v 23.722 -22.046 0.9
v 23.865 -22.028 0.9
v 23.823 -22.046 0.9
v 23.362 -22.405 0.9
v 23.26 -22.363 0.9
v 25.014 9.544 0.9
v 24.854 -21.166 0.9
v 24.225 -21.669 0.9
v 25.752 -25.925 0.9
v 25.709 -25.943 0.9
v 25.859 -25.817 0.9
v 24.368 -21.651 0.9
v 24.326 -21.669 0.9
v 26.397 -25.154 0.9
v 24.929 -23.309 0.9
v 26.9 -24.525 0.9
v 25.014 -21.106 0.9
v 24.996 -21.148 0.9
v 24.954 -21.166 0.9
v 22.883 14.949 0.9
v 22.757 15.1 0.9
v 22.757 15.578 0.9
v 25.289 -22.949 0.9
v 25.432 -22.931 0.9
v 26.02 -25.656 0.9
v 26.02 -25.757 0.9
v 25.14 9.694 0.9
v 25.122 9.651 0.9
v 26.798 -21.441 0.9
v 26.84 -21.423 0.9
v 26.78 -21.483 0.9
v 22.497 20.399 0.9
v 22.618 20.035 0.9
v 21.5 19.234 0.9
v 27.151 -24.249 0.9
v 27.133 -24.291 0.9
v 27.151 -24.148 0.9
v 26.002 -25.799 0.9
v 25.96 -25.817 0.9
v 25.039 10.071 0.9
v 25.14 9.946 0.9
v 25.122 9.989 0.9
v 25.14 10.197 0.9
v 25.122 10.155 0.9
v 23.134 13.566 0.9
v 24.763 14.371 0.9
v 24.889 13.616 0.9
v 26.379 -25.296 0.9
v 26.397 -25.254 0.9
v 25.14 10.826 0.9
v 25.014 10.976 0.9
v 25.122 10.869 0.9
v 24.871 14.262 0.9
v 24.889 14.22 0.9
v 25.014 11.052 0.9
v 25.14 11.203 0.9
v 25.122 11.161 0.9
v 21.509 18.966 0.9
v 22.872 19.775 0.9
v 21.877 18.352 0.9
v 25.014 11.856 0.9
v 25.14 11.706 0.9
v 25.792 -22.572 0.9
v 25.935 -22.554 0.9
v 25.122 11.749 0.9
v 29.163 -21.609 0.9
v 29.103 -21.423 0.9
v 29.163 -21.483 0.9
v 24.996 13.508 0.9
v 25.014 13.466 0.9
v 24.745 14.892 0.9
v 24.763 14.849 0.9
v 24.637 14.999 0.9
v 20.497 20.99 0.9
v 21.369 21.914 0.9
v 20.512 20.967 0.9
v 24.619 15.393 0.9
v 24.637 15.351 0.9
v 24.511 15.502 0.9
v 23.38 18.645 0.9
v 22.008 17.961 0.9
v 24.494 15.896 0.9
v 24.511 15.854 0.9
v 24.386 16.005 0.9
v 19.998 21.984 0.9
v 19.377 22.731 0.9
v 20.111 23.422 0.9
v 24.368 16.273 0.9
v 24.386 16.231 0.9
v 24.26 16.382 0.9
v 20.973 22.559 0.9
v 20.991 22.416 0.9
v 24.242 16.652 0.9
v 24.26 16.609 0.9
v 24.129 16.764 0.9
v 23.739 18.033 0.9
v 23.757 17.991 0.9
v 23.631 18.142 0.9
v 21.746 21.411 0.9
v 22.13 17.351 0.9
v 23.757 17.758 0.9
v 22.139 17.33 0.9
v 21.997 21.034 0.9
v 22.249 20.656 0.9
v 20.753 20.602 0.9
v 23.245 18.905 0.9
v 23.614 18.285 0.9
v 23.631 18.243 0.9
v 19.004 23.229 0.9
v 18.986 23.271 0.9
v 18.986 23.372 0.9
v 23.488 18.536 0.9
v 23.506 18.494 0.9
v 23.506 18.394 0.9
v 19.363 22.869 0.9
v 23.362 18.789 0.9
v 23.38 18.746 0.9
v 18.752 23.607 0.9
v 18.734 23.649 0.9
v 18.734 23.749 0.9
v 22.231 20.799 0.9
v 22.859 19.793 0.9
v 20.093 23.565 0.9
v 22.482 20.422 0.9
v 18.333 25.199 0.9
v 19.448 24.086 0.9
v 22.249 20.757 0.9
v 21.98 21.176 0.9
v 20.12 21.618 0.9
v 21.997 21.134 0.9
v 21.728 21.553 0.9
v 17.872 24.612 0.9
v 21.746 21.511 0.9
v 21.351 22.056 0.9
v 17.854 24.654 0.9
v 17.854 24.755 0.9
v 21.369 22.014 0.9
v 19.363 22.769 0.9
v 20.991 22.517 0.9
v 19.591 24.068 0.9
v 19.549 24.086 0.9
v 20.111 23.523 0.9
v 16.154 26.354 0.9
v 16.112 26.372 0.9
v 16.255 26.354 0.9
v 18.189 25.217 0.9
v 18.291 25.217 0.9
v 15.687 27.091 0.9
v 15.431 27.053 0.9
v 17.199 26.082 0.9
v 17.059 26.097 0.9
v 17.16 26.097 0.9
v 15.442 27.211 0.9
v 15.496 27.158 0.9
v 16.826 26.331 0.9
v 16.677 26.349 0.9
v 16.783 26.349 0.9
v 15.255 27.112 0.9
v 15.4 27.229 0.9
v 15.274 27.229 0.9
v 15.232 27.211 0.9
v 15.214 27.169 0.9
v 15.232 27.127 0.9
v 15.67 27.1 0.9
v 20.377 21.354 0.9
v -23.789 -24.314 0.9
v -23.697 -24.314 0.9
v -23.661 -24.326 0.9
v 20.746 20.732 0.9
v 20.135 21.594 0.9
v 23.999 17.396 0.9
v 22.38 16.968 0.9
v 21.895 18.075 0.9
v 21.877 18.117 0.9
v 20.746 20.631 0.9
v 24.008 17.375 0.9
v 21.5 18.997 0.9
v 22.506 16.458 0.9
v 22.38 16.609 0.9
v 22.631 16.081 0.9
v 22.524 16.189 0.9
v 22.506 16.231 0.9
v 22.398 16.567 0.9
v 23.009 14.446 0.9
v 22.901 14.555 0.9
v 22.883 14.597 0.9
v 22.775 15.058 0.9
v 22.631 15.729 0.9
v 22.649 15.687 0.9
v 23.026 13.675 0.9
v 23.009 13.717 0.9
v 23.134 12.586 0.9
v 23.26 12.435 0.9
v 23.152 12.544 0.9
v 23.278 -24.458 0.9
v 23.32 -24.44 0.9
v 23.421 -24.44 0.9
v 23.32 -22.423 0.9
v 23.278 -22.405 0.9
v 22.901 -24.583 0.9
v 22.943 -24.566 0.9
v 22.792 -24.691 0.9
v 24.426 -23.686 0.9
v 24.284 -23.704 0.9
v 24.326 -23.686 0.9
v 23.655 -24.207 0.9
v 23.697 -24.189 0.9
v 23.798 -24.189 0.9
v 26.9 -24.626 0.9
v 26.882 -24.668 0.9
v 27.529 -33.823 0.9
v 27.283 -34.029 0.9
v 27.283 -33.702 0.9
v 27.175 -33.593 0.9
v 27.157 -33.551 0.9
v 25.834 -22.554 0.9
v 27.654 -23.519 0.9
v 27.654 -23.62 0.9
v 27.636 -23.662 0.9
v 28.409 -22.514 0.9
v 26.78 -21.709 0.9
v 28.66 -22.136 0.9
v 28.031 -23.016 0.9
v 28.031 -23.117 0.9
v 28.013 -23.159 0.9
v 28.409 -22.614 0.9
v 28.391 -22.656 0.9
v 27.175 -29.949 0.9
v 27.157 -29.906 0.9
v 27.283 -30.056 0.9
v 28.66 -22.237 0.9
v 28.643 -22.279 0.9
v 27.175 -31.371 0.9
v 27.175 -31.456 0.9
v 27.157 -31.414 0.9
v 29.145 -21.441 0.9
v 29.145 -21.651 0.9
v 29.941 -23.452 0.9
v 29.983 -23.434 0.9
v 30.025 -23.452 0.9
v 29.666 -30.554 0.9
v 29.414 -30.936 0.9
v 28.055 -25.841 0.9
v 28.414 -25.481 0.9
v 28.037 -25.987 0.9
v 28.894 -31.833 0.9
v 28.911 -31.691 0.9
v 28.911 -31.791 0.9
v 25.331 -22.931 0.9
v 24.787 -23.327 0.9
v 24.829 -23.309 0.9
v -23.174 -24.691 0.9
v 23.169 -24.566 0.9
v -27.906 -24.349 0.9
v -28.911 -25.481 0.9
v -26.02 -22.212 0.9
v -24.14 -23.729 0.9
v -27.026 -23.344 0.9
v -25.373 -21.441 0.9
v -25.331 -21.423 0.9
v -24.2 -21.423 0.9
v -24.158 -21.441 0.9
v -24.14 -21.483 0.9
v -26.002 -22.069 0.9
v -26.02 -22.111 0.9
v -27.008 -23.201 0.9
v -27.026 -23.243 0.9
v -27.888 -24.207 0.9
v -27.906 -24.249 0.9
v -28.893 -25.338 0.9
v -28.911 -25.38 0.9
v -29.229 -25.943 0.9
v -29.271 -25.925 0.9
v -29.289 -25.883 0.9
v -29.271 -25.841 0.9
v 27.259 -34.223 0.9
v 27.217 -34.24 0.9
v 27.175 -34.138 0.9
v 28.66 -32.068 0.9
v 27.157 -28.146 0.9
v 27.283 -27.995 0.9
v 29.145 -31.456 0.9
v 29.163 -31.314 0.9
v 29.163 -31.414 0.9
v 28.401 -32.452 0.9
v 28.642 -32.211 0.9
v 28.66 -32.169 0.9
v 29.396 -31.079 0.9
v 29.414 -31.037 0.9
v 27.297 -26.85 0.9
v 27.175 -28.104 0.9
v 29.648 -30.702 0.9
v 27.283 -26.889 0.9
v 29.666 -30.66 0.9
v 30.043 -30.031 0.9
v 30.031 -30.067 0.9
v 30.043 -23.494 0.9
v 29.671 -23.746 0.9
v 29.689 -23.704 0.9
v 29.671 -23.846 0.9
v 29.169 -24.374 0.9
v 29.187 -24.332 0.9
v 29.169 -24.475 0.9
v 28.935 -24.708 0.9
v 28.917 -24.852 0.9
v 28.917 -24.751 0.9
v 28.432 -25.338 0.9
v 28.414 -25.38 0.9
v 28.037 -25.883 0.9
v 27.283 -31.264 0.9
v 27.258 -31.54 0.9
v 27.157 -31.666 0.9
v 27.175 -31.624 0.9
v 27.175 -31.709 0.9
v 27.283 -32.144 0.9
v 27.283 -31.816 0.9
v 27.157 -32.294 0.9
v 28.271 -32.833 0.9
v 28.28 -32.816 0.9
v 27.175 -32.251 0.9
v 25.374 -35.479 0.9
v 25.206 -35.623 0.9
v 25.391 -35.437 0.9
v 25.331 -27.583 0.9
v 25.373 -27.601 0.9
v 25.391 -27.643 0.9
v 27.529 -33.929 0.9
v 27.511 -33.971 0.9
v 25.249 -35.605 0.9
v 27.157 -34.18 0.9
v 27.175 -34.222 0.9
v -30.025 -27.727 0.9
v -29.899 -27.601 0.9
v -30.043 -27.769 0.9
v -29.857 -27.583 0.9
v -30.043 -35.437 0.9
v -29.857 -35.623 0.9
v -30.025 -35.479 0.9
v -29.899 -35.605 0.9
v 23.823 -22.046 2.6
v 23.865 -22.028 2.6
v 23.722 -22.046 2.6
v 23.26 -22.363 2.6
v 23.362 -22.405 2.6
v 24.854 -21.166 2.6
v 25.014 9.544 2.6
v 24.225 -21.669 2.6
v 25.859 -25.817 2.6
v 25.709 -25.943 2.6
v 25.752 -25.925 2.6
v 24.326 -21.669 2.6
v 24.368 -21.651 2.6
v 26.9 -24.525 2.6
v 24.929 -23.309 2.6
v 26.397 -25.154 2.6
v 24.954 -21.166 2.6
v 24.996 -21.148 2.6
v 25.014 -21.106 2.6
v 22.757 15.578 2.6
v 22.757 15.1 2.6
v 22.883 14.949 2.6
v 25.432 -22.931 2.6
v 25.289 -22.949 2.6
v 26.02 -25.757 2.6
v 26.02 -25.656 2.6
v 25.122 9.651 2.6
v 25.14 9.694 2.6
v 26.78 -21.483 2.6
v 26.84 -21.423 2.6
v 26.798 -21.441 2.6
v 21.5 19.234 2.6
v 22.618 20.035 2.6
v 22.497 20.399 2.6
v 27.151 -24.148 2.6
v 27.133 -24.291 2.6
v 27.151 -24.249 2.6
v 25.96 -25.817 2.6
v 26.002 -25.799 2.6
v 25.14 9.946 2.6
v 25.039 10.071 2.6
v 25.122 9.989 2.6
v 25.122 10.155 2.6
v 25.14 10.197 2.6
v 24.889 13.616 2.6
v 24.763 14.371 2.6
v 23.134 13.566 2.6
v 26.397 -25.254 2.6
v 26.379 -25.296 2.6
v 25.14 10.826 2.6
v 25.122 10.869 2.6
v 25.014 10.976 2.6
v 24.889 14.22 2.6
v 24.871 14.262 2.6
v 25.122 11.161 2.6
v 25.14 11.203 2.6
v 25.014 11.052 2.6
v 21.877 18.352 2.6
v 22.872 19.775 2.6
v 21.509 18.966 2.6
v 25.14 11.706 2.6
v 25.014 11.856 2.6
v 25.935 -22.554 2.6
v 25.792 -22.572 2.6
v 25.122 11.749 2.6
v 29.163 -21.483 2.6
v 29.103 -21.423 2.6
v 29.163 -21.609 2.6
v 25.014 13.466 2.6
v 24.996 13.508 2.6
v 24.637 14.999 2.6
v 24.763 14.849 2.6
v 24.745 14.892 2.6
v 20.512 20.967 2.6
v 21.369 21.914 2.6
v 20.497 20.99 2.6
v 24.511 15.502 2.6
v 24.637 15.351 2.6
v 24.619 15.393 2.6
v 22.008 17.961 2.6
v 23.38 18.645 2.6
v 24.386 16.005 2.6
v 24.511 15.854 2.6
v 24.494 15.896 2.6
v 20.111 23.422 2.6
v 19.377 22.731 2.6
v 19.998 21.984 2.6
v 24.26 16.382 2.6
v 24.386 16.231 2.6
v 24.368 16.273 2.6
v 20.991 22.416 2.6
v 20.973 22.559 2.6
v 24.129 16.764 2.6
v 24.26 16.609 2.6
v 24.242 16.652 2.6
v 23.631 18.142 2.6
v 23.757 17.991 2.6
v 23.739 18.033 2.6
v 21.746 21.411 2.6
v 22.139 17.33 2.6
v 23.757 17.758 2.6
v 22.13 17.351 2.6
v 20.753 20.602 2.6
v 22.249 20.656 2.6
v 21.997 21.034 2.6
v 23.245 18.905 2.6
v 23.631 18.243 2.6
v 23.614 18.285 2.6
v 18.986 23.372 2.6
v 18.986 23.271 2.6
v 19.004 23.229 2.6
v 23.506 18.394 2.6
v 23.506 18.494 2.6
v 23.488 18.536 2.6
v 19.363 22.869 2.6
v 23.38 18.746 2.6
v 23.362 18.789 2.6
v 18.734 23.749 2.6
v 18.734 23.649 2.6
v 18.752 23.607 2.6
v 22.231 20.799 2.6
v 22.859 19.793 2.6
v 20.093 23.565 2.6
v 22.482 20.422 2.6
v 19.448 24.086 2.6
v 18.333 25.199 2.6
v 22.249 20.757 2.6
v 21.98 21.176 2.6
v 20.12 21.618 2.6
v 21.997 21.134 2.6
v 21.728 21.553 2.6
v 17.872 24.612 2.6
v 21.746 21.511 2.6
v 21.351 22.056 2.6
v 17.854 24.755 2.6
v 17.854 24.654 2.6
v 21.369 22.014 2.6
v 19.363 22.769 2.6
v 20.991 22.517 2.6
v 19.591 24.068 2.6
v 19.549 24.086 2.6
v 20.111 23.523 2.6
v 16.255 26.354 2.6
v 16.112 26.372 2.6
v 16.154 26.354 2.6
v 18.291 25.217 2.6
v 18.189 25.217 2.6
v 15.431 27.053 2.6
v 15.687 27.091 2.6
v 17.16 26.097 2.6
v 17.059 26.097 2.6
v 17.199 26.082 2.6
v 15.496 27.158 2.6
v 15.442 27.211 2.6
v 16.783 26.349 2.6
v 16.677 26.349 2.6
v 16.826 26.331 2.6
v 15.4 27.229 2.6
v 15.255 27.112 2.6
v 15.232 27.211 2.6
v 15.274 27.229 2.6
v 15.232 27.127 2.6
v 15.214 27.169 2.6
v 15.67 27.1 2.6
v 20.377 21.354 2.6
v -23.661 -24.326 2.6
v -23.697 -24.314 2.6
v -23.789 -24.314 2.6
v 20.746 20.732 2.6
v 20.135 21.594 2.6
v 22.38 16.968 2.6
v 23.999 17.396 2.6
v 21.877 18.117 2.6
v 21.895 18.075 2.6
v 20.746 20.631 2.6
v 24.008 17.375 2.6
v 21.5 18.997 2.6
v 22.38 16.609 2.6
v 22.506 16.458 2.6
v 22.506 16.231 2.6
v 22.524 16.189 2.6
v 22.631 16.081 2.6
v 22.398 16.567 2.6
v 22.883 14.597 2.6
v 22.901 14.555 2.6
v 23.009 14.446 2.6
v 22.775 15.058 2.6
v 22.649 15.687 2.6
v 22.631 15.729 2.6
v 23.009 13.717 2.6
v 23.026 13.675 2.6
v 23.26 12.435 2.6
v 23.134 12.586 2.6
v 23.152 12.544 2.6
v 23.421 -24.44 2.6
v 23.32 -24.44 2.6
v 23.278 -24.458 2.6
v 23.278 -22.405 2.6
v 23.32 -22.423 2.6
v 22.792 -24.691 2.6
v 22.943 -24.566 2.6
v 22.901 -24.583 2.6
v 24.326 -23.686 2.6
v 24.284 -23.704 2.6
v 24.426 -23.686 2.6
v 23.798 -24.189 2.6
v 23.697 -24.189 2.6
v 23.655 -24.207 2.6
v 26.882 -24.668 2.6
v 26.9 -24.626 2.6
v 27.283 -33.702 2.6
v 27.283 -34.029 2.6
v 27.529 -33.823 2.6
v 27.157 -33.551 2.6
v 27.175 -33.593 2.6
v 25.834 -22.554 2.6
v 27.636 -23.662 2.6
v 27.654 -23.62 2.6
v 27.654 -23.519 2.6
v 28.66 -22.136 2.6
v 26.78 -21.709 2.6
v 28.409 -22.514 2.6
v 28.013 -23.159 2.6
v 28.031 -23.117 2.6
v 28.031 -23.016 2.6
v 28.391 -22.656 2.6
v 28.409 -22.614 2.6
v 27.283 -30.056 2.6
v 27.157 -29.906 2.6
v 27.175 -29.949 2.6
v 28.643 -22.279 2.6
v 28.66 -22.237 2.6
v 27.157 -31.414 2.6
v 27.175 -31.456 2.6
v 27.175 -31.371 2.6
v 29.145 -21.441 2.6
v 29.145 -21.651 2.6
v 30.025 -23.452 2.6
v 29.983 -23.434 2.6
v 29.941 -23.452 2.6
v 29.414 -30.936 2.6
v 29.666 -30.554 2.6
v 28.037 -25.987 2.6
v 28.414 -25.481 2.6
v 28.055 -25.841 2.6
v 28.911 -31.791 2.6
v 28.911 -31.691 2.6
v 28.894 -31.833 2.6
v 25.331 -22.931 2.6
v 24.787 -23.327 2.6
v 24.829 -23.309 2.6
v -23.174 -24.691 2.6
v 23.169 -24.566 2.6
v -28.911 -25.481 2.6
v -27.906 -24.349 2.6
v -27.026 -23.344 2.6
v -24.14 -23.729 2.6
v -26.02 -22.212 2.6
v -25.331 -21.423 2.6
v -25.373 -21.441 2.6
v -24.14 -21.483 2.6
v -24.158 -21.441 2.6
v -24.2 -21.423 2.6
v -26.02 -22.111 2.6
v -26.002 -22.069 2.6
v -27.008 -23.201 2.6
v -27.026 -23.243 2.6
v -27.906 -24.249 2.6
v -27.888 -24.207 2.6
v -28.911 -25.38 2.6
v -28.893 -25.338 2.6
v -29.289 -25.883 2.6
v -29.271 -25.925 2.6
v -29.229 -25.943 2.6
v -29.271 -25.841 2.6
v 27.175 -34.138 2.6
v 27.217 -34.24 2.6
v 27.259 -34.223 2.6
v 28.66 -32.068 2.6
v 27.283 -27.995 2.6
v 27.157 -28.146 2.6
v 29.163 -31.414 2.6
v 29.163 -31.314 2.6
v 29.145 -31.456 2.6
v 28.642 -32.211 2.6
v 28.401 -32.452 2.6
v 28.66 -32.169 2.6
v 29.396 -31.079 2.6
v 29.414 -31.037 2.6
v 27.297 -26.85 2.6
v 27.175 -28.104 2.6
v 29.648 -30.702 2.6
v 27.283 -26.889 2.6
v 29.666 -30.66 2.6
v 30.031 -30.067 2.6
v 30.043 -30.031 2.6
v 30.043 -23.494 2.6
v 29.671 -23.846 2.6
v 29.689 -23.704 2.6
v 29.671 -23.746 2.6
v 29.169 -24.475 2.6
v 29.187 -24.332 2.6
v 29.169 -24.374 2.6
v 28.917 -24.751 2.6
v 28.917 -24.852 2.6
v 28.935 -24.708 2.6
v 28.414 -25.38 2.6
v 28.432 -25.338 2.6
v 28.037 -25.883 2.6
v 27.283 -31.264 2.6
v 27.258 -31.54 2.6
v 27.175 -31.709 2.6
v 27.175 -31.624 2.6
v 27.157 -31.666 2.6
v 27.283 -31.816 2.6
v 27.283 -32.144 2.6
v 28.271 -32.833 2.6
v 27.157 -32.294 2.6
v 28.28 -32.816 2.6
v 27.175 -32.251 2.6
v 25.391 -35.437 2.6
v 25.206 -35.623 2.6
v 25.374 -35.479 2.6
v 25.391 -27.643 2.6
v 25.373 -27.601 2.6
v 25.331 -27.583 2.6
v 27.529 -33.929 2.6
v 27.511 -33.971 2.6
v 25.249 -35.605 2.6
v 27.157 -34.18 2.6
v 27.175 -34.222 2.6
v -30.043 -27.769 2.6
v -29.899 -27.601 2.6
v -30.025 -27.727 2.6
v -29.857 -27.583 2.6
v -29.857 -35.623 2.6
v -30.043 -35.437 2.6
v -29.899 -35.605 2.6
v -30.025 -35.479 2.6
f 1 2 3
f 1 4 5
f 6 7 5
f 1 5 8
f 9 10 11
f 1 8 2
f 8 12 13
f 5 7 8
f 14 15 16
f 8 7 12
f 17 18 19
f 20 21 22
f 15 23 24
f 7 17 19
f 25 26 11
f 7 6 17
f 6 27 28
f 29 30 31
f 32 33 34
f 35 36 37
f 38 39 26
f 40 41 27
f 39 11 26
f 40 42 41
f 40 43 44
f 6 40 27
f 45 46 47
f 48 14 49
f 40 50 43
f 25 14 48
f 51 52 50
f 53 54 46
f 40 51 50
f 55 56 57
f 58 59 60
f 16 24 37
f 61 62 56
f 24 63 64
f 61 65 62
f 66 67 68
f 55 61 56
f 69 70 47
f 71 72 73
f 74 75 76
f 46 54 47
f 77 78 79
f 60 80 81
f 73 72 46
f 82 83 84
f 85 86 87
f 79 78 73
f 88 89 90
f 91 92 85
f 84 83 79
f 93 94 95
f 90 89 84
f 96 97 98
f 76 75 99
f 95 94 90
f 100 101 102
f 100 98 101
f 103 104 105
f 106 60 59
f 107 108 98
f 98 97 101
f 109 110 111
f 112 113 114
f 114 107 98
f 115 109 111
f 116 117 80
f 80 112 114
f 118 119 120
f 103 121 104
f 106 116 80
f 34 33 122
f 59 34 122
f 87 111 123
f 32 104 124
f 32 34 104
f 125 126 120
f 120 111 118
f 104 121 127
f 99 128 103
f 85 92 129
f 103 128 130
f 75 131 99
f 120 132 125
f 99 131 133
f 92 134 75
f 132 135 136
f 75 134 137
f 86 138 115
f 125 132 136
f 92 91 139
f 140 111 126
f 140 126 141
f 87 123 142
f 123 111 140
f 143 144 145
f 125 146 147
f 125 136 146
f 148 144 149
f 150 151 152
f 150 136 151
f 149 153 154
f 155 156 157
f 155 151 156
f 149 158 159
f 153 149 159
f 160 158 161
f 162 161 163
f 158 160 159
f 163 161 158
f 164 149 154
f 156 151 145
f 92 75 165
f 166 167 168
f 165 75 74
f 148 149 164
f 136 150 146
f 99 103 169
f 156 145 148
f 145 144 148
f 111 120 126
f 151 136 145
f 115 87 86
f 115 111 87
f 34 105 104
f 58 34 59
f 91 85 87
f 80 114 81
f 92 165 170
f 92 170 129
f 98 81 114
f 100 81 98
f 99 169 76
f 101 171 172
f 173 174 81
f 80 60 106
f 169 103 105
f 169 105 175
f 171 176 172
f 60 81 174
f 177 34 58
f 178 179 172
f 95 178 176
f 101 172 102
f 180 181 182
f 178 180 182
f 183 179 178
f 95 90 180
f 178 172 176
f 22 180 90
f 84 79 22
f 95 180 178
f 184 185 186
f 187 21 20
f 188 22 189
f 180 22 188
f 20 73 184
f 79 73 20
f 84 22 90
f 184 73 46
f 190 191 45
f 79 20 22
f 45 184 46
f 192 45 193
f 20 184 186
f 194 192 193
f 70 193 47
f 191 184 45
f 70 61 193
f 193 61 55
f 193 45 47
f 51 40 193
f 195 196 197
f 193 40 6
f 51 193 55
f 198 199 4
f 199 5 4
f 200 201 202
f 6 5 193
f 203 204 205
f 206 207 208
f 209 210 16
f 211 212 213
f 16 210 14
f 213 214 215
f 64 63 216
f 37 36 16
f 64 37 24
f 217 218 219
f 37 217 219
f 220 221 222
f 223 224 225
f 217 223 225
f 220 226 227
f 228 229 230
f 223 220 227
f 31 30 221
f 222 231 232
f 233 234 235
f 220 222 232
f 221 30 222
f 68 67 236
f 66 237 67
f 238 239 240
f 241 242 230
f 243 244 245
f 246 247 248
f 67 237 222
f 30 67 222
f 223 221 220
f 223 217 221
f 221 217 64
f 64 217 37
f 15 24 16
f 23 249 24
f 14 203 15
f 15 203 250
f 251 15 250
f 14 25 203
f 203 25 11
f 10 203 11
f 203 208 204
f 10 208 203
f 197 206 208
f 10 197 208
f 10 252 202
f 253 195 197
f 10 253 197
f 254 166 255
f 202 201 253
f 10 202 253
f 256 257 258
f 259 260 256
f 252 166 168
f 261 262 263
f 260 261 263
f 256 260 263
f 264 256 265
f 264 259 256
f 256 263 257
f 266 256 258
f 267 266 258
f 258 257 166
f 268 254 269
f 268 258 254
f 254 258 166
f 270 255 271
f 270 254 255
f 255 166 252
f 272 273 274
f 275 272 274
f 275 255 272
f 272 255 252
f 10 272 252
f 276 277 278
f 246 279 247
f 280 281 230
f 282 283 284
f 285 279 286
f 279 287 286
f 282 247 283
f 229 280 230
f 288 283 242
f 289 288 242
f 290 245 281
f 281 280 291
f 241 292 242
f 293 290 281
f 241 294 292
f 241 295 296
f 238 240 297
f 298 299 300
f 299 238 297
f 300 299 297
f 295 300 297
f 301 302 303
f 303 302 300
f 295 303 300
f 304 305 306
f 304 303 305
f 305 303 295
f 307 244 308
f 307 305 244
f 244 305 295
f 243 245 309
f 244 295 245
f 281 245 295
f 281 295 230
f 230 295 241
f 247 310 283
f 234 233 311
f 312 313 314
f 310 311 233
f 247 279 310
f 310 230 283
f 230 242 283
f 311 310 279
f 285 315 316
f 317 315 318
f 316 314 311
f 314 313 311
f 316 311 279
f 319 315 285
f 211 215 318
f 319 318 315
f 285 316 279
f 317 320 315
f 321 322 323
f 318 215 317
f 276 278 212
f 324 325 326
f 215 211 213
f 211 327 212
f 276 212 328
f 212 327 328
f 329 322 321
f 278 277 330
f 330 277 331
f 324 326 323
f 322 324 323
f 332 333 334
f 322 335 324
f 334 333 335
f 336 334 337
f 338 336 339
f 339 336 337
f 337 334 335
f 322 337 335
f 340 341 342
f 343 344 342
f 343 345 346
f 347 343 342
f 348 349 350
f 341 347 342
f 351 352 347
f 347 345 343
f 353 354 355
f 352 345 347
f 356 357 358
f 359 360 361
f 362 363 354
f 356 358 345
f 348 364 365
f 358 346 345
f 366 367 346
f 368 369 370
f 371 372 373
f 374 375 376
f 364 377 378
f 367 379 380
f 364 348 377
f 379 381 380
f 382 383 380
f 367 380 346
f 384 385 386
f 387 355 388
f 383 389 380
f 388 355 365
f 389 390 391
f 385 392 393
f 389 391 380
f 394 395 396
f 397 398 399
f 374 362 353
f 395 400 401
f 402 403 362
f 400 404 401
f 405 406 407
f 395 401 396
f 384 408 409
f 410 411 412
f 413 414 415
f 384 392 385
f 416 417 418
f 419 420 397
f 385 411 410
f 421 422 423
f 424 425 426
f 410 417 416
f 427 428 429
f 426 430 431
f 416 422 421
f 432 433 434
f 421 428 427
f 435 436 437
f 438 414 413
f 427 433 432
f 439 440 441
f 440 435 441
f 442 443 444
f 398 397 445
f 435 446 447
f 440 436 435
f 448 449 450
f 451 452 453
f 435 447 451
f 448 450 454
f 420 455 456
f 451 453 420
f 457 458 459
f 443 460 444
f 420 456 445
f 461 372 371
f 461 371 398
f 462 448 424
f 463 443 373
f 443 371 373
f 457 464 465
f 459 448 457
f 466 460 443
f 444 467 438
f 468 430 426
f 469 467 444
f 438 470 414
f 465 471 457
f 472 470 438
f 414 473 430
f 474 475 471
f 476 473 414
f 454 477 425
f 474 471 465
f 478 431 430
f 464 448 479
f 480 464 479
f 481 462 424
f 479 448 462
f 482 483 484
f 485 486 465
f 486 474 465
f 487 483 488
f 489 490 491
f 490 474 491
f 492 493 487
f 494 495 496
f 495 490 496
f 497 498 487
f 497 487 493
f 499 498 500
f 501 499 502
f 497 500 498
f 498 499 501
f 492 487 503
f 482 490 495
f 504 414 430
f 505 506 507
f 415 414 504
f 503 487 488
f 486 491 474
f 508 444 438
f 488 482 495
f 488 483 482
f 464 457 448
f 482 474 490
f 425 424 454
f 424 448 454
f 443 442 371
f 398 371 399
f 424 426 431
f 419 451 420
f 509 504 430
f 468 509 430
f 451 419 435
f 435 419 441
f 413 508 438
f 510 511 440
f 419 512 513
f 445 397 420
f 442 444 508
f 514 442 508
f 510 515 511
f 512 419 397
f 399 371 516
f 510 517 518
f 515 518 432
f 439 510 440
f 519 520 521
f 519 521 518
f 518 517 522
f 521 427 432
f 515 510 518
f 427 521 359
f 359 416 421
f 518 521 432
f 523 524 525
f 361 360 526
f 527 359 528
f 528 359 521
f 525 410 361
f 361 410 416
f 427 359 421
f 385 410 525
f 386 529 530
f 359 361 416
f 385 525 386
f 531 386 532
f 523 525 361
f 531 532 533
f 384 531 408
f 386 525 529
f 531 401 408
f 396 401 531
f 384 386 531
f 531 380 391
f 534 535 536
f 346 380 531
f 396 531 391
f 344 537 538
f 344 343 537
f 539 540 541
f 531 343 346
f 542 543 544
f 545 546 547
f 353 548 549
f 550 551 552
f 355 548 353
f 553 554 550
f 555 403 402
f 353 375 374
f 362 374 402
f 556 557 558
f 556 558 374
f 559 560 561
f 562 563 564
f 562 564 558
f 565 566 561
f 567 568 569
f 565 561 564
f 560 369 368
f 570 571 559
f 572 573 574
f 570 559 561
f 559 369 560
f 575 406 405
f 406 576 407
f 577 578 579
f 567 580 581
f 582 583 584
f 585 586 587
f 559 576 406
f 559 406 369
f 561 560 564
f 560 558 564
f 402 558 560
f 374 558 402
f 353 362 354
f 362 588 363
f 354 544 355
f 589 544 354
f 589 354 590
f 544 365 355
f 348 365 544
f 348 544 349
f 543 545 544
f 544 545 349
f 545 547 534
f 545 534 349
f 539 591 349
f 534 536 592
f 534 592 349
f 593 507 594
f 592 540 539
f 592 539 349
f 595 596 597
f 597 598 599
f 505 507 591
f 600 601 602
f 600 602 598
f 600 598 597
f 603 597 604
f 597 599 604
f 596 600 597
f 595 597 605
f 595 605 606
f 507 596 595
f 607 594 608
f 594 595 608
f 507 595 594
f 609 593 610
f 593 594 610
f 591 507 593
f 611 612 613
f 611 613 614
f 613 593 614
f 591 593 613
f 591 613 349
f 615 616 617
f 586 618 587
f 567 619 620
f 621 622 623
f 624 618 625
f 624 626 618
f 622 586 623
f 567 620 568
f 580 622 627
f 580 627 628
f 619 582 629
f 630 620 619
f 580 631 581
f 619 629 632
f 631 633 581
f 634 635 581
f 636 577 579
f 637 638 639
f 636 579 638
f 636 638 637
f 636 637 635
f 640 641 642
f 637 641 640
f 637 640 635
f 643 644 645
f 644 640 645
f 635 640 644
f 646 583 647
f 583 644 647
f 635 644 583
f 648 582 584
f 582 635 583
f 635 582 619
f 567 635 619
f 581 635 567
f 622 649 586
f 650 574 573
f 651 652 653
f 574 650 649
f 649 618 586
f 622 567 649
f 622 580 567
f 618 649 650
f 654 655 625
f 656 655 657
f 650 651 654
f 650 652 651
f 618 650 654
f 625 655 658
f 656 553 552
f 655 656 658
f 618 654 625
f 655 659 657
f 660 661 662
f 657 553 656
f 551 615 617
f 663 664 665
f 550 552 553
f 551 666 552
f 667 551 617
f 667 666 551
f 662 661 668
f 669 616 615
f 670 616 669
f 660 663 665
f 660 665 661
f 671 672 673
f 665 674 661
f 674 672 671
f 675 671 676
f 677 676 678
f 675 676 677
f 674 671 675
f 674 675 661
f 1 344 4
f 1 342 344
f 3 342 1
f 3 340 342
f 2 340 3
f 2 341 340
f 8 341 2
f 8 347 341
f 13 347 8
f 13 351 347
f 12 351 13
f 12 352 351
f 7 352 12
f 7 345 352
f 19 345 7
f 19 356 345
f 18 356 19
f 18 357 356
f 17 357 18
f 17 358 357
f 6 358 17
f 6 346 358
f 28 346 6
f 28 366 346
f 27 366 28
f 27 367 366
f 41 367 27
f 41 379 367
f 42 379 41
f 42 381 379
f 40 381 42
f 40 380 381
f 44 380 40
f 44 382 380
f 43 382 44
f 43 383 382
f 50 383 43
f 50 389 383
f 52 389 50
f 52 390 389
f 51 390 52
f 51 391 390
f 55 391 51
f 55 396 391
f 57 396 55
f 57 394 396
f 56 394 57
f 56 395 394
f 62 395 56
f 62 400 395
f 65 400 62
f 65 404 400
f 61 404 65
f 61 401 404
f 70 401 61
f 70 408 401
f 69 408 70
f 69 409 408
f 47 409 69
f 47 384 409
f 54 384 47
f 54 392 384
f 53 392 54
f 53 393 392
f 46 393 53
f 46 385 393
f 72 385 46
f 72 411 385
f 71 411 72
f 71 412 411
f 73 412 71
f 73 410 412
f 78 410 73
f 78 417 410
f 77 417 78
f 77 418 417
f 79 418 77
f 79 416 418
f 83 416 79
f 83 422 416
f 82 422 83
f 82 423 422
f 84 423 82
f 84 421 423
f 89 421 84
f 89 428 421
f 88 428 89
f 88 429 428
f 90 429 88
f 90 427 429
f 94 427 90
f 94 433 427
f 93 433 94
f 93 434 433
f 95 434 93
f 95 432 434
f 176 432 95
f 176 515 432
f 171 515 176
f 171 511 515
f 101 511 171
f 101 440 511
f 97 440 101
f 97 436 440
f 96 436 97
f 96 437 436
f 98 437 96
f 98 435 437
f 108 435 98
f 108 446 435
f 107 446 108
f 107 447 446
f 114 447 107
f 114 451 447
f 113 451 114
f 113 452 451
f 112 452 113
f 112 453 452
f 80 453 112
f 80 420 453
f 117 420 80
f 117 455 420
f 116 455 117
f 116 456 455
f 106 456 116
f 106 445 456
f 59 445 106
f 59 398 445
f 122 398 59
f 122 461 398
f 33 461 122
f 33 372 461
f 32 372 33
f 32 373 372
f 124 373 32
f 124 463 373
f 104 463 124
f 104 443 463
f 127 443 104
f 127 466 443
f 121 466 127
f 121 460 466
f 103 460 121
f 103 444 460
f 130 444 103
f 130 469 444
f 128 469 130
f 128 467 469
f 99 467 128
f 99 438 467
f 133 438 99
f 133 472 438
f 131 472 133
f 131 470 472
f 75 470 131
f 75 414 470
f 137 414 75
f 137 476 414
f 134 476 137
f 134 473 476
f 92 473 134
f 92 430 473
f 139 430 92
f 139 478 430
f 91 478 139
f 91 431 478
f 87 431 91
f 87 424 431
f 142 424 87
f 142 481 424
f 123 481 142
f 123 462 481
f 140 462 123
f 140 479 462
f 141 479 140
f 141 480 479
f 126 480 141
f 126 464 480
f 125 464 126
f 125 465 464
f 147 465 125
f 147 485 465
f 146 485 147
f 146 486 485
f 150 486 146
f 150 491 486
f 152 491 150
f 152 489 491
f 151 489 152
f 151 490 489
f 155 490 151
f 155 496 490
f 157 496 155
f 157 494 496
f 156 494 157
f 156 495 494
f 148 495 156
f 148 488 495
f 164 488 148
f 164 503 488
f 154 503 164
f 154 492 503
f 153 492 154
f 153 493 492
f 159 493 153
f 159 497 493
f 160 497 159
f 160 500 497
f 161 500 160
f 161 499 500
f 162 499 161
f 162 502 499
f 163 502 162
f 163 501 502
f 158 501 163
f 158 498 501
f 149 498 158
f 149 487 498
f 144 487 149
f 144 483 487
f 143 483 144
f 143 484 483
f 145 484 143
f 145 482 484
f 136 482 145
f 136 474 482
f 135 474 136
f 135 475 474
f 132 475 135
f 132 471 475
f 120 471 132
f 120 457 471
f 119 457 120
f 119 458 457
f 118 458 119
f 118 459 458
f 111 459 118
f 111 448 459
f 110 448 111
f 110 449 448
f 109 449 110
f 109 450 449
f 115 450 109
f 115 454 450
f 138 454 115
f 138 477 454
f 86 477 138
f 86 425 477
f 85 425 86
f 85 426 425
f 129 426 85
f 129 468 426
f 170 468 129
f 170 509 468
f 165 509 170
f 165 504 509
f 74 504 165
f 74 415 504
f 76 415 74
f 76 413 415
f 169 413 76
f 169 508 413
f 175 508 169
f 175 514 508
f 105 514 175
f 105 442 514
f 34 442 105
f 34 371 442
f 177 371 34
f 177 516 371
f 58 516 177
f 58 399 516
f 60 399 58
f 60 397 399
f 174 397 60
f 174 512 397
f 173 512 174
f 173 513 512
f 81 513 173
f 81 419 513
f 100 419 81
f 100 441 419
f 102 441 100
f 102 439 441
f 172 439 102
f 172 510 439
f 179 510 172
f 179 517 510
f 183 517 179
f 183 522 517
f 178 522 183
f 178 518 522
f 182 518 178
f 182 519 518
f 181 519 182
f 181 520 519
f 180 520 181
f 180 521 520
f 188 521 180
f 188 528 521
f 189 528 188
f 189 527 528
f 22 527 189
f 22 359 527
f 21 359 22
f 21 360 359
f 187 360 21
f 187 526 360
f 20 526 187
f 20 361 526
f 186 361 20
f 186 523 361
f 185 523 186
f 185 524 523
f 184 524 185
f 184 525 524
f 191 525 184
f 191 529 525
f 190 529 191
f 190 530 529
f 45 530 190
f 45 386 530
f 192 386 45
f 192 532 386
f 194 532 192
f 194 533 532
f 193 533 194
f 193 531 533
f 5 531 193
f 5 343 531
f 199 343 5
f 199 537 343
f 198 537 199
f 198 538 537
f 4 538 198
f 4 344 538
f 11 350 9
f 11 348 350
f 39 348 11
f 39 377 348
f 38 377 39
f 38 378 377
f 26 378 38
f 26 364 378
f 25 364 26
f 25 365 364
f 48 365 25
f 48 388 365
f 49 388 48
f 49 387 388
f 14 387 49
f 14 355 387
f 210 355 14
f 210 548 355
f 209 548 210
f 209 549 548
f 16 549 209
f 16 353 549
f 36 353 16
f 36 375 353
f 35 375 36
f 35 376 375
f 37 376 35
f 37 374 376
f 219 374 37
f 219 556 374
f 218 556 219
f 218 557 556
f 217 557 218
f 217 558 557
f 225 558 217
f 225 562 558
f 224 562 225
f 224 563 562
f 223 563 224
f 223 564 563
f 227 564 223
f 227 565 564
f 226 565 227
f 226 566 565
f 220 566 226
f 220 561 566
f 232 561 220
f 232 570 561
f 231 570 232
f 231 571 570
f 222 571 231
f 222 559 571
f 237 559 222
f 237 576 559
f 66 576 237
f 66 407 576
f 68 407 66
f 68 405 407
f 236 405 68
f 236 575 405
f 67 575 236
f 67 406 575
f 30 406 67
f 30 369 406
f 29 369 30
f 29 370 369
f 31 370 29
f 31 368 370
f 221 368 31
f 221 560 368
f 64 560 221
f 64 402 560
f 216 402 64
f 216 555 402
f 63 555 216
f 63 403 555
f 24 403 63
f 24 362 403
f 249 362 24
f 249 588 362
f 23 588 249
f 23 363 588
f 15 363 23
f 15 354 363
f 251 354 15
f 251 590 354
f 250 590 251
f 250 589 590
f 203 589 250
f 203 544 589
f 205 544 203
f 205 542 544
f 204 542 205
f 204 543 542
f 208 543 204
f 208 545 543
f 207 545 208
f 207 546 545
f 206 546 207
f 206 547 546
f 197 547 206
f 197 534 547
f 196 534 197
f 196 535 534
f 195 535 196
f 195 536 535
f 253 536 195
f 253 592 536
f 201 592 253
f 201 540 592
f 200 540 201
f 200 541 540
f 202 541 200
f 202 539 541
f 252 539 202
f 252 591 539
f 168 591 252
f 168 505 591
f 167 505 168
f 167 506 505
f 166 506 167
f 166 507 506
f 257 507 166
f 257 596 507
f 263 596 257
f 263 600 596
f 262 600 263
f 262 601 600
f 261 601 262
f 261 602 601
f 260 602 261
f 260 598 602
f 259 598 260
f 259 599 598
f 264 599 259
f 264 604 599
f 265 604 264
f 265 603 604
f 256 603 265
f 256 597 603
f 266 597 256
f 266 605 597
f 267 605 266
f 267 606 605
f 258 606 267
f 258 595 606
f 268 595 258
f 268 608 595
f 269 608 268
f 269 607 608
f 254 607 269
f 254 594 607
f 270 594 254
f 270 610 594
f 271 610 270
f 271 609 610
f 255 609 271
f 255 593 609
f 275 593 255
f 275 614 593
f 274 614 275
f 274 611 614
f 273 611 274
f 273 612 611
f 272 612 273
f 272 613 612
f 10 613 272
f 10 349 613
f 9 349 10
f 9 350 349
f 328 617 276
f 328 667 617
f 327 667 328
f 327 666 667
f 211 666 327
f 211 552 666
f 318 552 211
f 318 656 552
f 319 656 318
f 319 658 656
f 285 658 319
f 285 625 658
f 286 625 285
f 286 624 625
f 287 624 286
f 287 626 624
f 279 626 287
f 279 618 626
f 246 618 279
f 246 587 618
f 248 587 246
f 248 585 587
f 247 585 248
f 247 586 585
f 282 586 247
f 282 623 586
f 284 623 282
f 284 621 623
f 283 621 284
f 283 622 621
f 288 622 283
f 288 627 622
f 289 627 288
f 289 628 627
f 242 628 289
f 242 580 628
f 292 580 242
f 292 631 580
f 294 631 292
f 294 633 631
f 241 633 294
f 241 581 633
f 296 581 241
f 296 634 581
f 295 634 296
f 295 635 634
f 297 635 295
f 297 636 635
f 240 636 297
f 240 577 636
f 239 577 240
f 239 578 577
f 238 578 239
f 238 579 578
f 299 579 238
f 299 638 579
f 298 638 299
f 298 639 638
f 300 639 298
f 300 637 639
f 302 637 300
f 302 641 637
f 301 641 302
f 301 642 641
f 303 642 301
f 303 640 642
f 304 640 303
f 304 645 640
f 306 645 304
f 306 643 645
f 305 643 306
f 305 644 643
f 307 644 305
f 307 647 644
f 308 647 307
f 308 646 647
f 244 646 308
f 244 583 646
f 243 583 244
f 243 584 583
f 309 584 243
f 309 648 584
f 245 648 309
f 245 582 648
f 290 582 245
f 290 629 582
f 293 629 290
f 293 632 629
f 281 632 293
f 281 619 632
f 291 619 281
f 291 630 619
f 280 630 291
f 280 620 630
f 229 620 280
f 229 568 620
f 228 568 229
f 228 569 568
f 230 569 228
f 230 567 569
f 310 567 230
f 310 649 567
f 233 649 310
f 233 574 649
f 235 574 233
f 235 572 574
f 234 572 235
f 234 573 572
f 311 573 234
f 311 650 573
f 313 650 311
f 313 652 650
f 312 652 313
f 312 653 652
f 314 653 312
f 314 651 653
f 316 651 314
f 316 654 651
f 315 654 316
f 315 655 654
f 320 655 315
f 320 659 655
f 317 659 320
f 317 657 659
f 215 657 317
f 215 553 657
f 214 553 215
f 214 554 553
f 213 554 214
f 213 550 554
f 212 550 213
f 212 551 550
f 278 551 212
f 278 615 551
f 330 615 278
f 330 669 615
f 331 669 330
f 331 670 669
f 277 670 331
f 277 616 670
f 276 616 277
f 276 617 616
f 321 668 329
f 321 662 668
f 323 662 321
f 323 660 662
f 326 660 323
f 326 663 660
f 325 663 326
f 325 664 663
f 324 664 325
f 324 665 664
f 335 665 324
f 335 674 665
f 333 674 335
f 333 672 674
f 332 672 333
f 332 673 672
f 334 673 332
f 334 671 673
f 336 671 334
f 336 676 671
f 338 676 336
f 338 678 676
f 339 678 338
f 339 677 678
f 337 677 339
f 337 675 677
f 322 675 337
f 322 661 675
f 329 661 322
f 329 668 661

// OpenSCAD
$fn = 24;
translate([0, -2.500, 0.900])
  linear_extrude(height=1.700) {
offset(r=0.06, $fn=8) {
    polygon(points=[[-29.983,-25.269],[-29.983,-32.937],[-29.857,-33.063],[25.206,-33.063],[25.331,-32.937],[25.331,-25.143],[-29.857,-25.143]], paths=[[0,1,2,3,4,5,6]]);
    polygon(points=[[29.983,-20.869],[29.983,-20.994],[29.731,-21.246],[29.731,-21.371],[29.229,-21.874],[29.229,-22.000],[28.977,-22.251],[28.977,-22.377],[28.474,-22.880],[28.474,-23.006],[28.097,-23.383],[28.097,-23.509],[27.343,-24.389],[27.343,-25.520],[27.217,-25.646],[27.217,-27.406],[27.343,-27.531],[27.343,-28.789],[27.217,-28.914],[27.343,-29.040],[27.217,-29.166],[27.343,-29.291],[27.343,-29.669],[27.217,-29.794],[27.217,-31.051],[27.343,-31.177],[27.343,-31.554],[27.217,-31.680],[27.469,-31.429],[27.469,-31.303],[28.223,-30.297],[28.349,-29.920],[28.600,-29.669],[28.600,-29.543],[28.851,-29.291],[28.851,-29.166],[29.103,-28.914],[29.103,-28.789],[29.354,-28.537],[29.354,-28.411],[29.606,-28.160],[29.606,-28.034],[29.983,-27.531]], paths=[[0,1,2,3,4,5,6,7,8,9,10,11,12,13,14,15,16,17,18,19,20,21,22,23,24,25,26,27,28,29,30,31,32,33,34,35,36,37,38,39,40,41,42]]);
    polygon(points=[[-29.229,-23.383],[25.709,-23.383],[25.834,-23.257],[25.960,-23.257],[25.960,-23.131],[26.337,-22.754],[26.337,-22.629],[26.840,-22.126],[26.840,-22.000],[27.091,-21.749],[27.091,-21.623],[27.594,-21.120],[27.594,-20.994],[27.971,-20.617],[27.971,-20.491],[28.349,-20.114],[28.349,-19.989],[28.600,-19.737],[28.600,-19.611],[29.103,-19.109],[29.103,-18.983],[26.840,-18.983],[26.840,-19.234],[25.960,-20.114],[25.834,-20.114],[25.457,-20.491],[25.331,-20.491],[24.954,-20.869],[24.829,-20.869],[24.451,-21.246],[24.326,-21.246],[23.823,-21.749],[23.697,-21.749],[23.446,-22.000],[23.320,-22.000],[23.194,-22.126],[22.943,-22.126],[22.817,-22.251],[-23.194,-22.251],[-23.697,-21.874],[-23.823,-21.874],[-24.200,-21.246],[-24.200,-18.983],[-25.331,-18.983],[-25.960,-19.611],[-25.960,-19.737],[-26.966,-20.743],[-26.966,-20.869],[-27.846,-21.749],[-27.846,-21.874],[-28.851,-22.880],[-28.851,-23.006]], paths=[[0,1,2,3,4,5,6,7,8,9,10,11,12,13,14,15,16,17,18,19,20,21,22,23,24,25,26,27,28,29,30,31,32,33,34,35,36,37,38,39,40,41,42,43,44,45,46,47,48,49,50,51]]);
    polygon(points=[[15.023,29.920],[15.274,29.669],[15.400,29.669],[16.154,28.914],[16.280,28.914],[17.914,27.280],[17.914,27.154],[18.794,26.274],[18.794,26.149],[19.046,25.897],[19.046,25.771],[19.423,25.394],[19.423,25.269],[20.051,24.514],[20.177,24.137],[20.429,23.886],[20.554,23.509],[20.806,23.257],[20.806,23.131],[21.560,21.749],[21.560,21.497],[21.937,20.869],[21.937,20.617],[22.063,20.491],[22.189,19.863],[22.440,19.486],[22.440,19.109],[22.566,18.983],[22.566,18.731],[22.691,18.606],[22.691,18.229],[22.817,18.103],[22.817,17.600],[22.943,17.474],[22.943,17.097],[23.069,16.971],[23.069,16.217],[23.194,16.091],[23.194,15.086],[23.320,14.960],[23.320,-19.863],[23.697,-19.486],[23.823,-19.486],[24.200,-19.109],[24.326,-19.109],[24.829,-18.606],[24.954,-18.606],[24.954,12.069],[25.080,12.194],[25.080,12.446],[24.954,12.571],[25.080,12.697],[25.080,13.326],[24.954,13.451],[24.954,13.577],[25.080,13.703],[25.080,14.206],[24.954,14.331],[24.954,15.966],[24.829,16.091],[24.829,16.720],[24.703,16.846],[24.703,17.349],[24.577,17.474],[24.577,17.851],[24.451,17.977],[24.451,18.354],[24.326,18.480],[24.326,18.731],[24.200,18.857],[24.200,19.109],[24.074,19.234],[23.949,19.863],[23.697,20.240],[23.697,20.491],[23.571,20.617],[23.571,20.743],[23.446,20.869],[23.446,20.994],[23.320,21.120],[23.320,21.246],[23.194,21.371],[22.817,22.251],[22.566,22.503],[22.440,22.880],[22.189,23.131],[22.189,23.257],[21.937,23.509],[21.937,23.634],[21.686,23.886],[21.686,24.011],[21.309,24.389],[21.309,24.514],[20.931,24.891],[20.931,25.017],[20.051,25.897],[20.051,26.023],[19.549,26.526],[19.423,26.526],[18.291,27.657],[18.166,27.657],[17.160,28.537],[17.034,28.537],[16.783,28.789],[16.657,28.789],[15.651,29.543],[15.274,29.669]], paths=[[0,1,2,3,4,5,6,7,8,9,10,11,12,13,14,15,16,17,18,19,20,21,22,23,24,25,26,27,28,29,30,31,32,33,34,35,36,37,38,39,40,41,42,43,44,45,46,47,48,49,50,51,52,53,54,55,56,57,58,59,60,61,62,63,64,65,66,67,68,69,70,71,72,73,74,75,76,77,78,79,80,81,82,83,84,85,86,87,88,89,90,91,92,93,94,95,96,97,98,99,100,101,102,103,104,105,106]]);
}
}
